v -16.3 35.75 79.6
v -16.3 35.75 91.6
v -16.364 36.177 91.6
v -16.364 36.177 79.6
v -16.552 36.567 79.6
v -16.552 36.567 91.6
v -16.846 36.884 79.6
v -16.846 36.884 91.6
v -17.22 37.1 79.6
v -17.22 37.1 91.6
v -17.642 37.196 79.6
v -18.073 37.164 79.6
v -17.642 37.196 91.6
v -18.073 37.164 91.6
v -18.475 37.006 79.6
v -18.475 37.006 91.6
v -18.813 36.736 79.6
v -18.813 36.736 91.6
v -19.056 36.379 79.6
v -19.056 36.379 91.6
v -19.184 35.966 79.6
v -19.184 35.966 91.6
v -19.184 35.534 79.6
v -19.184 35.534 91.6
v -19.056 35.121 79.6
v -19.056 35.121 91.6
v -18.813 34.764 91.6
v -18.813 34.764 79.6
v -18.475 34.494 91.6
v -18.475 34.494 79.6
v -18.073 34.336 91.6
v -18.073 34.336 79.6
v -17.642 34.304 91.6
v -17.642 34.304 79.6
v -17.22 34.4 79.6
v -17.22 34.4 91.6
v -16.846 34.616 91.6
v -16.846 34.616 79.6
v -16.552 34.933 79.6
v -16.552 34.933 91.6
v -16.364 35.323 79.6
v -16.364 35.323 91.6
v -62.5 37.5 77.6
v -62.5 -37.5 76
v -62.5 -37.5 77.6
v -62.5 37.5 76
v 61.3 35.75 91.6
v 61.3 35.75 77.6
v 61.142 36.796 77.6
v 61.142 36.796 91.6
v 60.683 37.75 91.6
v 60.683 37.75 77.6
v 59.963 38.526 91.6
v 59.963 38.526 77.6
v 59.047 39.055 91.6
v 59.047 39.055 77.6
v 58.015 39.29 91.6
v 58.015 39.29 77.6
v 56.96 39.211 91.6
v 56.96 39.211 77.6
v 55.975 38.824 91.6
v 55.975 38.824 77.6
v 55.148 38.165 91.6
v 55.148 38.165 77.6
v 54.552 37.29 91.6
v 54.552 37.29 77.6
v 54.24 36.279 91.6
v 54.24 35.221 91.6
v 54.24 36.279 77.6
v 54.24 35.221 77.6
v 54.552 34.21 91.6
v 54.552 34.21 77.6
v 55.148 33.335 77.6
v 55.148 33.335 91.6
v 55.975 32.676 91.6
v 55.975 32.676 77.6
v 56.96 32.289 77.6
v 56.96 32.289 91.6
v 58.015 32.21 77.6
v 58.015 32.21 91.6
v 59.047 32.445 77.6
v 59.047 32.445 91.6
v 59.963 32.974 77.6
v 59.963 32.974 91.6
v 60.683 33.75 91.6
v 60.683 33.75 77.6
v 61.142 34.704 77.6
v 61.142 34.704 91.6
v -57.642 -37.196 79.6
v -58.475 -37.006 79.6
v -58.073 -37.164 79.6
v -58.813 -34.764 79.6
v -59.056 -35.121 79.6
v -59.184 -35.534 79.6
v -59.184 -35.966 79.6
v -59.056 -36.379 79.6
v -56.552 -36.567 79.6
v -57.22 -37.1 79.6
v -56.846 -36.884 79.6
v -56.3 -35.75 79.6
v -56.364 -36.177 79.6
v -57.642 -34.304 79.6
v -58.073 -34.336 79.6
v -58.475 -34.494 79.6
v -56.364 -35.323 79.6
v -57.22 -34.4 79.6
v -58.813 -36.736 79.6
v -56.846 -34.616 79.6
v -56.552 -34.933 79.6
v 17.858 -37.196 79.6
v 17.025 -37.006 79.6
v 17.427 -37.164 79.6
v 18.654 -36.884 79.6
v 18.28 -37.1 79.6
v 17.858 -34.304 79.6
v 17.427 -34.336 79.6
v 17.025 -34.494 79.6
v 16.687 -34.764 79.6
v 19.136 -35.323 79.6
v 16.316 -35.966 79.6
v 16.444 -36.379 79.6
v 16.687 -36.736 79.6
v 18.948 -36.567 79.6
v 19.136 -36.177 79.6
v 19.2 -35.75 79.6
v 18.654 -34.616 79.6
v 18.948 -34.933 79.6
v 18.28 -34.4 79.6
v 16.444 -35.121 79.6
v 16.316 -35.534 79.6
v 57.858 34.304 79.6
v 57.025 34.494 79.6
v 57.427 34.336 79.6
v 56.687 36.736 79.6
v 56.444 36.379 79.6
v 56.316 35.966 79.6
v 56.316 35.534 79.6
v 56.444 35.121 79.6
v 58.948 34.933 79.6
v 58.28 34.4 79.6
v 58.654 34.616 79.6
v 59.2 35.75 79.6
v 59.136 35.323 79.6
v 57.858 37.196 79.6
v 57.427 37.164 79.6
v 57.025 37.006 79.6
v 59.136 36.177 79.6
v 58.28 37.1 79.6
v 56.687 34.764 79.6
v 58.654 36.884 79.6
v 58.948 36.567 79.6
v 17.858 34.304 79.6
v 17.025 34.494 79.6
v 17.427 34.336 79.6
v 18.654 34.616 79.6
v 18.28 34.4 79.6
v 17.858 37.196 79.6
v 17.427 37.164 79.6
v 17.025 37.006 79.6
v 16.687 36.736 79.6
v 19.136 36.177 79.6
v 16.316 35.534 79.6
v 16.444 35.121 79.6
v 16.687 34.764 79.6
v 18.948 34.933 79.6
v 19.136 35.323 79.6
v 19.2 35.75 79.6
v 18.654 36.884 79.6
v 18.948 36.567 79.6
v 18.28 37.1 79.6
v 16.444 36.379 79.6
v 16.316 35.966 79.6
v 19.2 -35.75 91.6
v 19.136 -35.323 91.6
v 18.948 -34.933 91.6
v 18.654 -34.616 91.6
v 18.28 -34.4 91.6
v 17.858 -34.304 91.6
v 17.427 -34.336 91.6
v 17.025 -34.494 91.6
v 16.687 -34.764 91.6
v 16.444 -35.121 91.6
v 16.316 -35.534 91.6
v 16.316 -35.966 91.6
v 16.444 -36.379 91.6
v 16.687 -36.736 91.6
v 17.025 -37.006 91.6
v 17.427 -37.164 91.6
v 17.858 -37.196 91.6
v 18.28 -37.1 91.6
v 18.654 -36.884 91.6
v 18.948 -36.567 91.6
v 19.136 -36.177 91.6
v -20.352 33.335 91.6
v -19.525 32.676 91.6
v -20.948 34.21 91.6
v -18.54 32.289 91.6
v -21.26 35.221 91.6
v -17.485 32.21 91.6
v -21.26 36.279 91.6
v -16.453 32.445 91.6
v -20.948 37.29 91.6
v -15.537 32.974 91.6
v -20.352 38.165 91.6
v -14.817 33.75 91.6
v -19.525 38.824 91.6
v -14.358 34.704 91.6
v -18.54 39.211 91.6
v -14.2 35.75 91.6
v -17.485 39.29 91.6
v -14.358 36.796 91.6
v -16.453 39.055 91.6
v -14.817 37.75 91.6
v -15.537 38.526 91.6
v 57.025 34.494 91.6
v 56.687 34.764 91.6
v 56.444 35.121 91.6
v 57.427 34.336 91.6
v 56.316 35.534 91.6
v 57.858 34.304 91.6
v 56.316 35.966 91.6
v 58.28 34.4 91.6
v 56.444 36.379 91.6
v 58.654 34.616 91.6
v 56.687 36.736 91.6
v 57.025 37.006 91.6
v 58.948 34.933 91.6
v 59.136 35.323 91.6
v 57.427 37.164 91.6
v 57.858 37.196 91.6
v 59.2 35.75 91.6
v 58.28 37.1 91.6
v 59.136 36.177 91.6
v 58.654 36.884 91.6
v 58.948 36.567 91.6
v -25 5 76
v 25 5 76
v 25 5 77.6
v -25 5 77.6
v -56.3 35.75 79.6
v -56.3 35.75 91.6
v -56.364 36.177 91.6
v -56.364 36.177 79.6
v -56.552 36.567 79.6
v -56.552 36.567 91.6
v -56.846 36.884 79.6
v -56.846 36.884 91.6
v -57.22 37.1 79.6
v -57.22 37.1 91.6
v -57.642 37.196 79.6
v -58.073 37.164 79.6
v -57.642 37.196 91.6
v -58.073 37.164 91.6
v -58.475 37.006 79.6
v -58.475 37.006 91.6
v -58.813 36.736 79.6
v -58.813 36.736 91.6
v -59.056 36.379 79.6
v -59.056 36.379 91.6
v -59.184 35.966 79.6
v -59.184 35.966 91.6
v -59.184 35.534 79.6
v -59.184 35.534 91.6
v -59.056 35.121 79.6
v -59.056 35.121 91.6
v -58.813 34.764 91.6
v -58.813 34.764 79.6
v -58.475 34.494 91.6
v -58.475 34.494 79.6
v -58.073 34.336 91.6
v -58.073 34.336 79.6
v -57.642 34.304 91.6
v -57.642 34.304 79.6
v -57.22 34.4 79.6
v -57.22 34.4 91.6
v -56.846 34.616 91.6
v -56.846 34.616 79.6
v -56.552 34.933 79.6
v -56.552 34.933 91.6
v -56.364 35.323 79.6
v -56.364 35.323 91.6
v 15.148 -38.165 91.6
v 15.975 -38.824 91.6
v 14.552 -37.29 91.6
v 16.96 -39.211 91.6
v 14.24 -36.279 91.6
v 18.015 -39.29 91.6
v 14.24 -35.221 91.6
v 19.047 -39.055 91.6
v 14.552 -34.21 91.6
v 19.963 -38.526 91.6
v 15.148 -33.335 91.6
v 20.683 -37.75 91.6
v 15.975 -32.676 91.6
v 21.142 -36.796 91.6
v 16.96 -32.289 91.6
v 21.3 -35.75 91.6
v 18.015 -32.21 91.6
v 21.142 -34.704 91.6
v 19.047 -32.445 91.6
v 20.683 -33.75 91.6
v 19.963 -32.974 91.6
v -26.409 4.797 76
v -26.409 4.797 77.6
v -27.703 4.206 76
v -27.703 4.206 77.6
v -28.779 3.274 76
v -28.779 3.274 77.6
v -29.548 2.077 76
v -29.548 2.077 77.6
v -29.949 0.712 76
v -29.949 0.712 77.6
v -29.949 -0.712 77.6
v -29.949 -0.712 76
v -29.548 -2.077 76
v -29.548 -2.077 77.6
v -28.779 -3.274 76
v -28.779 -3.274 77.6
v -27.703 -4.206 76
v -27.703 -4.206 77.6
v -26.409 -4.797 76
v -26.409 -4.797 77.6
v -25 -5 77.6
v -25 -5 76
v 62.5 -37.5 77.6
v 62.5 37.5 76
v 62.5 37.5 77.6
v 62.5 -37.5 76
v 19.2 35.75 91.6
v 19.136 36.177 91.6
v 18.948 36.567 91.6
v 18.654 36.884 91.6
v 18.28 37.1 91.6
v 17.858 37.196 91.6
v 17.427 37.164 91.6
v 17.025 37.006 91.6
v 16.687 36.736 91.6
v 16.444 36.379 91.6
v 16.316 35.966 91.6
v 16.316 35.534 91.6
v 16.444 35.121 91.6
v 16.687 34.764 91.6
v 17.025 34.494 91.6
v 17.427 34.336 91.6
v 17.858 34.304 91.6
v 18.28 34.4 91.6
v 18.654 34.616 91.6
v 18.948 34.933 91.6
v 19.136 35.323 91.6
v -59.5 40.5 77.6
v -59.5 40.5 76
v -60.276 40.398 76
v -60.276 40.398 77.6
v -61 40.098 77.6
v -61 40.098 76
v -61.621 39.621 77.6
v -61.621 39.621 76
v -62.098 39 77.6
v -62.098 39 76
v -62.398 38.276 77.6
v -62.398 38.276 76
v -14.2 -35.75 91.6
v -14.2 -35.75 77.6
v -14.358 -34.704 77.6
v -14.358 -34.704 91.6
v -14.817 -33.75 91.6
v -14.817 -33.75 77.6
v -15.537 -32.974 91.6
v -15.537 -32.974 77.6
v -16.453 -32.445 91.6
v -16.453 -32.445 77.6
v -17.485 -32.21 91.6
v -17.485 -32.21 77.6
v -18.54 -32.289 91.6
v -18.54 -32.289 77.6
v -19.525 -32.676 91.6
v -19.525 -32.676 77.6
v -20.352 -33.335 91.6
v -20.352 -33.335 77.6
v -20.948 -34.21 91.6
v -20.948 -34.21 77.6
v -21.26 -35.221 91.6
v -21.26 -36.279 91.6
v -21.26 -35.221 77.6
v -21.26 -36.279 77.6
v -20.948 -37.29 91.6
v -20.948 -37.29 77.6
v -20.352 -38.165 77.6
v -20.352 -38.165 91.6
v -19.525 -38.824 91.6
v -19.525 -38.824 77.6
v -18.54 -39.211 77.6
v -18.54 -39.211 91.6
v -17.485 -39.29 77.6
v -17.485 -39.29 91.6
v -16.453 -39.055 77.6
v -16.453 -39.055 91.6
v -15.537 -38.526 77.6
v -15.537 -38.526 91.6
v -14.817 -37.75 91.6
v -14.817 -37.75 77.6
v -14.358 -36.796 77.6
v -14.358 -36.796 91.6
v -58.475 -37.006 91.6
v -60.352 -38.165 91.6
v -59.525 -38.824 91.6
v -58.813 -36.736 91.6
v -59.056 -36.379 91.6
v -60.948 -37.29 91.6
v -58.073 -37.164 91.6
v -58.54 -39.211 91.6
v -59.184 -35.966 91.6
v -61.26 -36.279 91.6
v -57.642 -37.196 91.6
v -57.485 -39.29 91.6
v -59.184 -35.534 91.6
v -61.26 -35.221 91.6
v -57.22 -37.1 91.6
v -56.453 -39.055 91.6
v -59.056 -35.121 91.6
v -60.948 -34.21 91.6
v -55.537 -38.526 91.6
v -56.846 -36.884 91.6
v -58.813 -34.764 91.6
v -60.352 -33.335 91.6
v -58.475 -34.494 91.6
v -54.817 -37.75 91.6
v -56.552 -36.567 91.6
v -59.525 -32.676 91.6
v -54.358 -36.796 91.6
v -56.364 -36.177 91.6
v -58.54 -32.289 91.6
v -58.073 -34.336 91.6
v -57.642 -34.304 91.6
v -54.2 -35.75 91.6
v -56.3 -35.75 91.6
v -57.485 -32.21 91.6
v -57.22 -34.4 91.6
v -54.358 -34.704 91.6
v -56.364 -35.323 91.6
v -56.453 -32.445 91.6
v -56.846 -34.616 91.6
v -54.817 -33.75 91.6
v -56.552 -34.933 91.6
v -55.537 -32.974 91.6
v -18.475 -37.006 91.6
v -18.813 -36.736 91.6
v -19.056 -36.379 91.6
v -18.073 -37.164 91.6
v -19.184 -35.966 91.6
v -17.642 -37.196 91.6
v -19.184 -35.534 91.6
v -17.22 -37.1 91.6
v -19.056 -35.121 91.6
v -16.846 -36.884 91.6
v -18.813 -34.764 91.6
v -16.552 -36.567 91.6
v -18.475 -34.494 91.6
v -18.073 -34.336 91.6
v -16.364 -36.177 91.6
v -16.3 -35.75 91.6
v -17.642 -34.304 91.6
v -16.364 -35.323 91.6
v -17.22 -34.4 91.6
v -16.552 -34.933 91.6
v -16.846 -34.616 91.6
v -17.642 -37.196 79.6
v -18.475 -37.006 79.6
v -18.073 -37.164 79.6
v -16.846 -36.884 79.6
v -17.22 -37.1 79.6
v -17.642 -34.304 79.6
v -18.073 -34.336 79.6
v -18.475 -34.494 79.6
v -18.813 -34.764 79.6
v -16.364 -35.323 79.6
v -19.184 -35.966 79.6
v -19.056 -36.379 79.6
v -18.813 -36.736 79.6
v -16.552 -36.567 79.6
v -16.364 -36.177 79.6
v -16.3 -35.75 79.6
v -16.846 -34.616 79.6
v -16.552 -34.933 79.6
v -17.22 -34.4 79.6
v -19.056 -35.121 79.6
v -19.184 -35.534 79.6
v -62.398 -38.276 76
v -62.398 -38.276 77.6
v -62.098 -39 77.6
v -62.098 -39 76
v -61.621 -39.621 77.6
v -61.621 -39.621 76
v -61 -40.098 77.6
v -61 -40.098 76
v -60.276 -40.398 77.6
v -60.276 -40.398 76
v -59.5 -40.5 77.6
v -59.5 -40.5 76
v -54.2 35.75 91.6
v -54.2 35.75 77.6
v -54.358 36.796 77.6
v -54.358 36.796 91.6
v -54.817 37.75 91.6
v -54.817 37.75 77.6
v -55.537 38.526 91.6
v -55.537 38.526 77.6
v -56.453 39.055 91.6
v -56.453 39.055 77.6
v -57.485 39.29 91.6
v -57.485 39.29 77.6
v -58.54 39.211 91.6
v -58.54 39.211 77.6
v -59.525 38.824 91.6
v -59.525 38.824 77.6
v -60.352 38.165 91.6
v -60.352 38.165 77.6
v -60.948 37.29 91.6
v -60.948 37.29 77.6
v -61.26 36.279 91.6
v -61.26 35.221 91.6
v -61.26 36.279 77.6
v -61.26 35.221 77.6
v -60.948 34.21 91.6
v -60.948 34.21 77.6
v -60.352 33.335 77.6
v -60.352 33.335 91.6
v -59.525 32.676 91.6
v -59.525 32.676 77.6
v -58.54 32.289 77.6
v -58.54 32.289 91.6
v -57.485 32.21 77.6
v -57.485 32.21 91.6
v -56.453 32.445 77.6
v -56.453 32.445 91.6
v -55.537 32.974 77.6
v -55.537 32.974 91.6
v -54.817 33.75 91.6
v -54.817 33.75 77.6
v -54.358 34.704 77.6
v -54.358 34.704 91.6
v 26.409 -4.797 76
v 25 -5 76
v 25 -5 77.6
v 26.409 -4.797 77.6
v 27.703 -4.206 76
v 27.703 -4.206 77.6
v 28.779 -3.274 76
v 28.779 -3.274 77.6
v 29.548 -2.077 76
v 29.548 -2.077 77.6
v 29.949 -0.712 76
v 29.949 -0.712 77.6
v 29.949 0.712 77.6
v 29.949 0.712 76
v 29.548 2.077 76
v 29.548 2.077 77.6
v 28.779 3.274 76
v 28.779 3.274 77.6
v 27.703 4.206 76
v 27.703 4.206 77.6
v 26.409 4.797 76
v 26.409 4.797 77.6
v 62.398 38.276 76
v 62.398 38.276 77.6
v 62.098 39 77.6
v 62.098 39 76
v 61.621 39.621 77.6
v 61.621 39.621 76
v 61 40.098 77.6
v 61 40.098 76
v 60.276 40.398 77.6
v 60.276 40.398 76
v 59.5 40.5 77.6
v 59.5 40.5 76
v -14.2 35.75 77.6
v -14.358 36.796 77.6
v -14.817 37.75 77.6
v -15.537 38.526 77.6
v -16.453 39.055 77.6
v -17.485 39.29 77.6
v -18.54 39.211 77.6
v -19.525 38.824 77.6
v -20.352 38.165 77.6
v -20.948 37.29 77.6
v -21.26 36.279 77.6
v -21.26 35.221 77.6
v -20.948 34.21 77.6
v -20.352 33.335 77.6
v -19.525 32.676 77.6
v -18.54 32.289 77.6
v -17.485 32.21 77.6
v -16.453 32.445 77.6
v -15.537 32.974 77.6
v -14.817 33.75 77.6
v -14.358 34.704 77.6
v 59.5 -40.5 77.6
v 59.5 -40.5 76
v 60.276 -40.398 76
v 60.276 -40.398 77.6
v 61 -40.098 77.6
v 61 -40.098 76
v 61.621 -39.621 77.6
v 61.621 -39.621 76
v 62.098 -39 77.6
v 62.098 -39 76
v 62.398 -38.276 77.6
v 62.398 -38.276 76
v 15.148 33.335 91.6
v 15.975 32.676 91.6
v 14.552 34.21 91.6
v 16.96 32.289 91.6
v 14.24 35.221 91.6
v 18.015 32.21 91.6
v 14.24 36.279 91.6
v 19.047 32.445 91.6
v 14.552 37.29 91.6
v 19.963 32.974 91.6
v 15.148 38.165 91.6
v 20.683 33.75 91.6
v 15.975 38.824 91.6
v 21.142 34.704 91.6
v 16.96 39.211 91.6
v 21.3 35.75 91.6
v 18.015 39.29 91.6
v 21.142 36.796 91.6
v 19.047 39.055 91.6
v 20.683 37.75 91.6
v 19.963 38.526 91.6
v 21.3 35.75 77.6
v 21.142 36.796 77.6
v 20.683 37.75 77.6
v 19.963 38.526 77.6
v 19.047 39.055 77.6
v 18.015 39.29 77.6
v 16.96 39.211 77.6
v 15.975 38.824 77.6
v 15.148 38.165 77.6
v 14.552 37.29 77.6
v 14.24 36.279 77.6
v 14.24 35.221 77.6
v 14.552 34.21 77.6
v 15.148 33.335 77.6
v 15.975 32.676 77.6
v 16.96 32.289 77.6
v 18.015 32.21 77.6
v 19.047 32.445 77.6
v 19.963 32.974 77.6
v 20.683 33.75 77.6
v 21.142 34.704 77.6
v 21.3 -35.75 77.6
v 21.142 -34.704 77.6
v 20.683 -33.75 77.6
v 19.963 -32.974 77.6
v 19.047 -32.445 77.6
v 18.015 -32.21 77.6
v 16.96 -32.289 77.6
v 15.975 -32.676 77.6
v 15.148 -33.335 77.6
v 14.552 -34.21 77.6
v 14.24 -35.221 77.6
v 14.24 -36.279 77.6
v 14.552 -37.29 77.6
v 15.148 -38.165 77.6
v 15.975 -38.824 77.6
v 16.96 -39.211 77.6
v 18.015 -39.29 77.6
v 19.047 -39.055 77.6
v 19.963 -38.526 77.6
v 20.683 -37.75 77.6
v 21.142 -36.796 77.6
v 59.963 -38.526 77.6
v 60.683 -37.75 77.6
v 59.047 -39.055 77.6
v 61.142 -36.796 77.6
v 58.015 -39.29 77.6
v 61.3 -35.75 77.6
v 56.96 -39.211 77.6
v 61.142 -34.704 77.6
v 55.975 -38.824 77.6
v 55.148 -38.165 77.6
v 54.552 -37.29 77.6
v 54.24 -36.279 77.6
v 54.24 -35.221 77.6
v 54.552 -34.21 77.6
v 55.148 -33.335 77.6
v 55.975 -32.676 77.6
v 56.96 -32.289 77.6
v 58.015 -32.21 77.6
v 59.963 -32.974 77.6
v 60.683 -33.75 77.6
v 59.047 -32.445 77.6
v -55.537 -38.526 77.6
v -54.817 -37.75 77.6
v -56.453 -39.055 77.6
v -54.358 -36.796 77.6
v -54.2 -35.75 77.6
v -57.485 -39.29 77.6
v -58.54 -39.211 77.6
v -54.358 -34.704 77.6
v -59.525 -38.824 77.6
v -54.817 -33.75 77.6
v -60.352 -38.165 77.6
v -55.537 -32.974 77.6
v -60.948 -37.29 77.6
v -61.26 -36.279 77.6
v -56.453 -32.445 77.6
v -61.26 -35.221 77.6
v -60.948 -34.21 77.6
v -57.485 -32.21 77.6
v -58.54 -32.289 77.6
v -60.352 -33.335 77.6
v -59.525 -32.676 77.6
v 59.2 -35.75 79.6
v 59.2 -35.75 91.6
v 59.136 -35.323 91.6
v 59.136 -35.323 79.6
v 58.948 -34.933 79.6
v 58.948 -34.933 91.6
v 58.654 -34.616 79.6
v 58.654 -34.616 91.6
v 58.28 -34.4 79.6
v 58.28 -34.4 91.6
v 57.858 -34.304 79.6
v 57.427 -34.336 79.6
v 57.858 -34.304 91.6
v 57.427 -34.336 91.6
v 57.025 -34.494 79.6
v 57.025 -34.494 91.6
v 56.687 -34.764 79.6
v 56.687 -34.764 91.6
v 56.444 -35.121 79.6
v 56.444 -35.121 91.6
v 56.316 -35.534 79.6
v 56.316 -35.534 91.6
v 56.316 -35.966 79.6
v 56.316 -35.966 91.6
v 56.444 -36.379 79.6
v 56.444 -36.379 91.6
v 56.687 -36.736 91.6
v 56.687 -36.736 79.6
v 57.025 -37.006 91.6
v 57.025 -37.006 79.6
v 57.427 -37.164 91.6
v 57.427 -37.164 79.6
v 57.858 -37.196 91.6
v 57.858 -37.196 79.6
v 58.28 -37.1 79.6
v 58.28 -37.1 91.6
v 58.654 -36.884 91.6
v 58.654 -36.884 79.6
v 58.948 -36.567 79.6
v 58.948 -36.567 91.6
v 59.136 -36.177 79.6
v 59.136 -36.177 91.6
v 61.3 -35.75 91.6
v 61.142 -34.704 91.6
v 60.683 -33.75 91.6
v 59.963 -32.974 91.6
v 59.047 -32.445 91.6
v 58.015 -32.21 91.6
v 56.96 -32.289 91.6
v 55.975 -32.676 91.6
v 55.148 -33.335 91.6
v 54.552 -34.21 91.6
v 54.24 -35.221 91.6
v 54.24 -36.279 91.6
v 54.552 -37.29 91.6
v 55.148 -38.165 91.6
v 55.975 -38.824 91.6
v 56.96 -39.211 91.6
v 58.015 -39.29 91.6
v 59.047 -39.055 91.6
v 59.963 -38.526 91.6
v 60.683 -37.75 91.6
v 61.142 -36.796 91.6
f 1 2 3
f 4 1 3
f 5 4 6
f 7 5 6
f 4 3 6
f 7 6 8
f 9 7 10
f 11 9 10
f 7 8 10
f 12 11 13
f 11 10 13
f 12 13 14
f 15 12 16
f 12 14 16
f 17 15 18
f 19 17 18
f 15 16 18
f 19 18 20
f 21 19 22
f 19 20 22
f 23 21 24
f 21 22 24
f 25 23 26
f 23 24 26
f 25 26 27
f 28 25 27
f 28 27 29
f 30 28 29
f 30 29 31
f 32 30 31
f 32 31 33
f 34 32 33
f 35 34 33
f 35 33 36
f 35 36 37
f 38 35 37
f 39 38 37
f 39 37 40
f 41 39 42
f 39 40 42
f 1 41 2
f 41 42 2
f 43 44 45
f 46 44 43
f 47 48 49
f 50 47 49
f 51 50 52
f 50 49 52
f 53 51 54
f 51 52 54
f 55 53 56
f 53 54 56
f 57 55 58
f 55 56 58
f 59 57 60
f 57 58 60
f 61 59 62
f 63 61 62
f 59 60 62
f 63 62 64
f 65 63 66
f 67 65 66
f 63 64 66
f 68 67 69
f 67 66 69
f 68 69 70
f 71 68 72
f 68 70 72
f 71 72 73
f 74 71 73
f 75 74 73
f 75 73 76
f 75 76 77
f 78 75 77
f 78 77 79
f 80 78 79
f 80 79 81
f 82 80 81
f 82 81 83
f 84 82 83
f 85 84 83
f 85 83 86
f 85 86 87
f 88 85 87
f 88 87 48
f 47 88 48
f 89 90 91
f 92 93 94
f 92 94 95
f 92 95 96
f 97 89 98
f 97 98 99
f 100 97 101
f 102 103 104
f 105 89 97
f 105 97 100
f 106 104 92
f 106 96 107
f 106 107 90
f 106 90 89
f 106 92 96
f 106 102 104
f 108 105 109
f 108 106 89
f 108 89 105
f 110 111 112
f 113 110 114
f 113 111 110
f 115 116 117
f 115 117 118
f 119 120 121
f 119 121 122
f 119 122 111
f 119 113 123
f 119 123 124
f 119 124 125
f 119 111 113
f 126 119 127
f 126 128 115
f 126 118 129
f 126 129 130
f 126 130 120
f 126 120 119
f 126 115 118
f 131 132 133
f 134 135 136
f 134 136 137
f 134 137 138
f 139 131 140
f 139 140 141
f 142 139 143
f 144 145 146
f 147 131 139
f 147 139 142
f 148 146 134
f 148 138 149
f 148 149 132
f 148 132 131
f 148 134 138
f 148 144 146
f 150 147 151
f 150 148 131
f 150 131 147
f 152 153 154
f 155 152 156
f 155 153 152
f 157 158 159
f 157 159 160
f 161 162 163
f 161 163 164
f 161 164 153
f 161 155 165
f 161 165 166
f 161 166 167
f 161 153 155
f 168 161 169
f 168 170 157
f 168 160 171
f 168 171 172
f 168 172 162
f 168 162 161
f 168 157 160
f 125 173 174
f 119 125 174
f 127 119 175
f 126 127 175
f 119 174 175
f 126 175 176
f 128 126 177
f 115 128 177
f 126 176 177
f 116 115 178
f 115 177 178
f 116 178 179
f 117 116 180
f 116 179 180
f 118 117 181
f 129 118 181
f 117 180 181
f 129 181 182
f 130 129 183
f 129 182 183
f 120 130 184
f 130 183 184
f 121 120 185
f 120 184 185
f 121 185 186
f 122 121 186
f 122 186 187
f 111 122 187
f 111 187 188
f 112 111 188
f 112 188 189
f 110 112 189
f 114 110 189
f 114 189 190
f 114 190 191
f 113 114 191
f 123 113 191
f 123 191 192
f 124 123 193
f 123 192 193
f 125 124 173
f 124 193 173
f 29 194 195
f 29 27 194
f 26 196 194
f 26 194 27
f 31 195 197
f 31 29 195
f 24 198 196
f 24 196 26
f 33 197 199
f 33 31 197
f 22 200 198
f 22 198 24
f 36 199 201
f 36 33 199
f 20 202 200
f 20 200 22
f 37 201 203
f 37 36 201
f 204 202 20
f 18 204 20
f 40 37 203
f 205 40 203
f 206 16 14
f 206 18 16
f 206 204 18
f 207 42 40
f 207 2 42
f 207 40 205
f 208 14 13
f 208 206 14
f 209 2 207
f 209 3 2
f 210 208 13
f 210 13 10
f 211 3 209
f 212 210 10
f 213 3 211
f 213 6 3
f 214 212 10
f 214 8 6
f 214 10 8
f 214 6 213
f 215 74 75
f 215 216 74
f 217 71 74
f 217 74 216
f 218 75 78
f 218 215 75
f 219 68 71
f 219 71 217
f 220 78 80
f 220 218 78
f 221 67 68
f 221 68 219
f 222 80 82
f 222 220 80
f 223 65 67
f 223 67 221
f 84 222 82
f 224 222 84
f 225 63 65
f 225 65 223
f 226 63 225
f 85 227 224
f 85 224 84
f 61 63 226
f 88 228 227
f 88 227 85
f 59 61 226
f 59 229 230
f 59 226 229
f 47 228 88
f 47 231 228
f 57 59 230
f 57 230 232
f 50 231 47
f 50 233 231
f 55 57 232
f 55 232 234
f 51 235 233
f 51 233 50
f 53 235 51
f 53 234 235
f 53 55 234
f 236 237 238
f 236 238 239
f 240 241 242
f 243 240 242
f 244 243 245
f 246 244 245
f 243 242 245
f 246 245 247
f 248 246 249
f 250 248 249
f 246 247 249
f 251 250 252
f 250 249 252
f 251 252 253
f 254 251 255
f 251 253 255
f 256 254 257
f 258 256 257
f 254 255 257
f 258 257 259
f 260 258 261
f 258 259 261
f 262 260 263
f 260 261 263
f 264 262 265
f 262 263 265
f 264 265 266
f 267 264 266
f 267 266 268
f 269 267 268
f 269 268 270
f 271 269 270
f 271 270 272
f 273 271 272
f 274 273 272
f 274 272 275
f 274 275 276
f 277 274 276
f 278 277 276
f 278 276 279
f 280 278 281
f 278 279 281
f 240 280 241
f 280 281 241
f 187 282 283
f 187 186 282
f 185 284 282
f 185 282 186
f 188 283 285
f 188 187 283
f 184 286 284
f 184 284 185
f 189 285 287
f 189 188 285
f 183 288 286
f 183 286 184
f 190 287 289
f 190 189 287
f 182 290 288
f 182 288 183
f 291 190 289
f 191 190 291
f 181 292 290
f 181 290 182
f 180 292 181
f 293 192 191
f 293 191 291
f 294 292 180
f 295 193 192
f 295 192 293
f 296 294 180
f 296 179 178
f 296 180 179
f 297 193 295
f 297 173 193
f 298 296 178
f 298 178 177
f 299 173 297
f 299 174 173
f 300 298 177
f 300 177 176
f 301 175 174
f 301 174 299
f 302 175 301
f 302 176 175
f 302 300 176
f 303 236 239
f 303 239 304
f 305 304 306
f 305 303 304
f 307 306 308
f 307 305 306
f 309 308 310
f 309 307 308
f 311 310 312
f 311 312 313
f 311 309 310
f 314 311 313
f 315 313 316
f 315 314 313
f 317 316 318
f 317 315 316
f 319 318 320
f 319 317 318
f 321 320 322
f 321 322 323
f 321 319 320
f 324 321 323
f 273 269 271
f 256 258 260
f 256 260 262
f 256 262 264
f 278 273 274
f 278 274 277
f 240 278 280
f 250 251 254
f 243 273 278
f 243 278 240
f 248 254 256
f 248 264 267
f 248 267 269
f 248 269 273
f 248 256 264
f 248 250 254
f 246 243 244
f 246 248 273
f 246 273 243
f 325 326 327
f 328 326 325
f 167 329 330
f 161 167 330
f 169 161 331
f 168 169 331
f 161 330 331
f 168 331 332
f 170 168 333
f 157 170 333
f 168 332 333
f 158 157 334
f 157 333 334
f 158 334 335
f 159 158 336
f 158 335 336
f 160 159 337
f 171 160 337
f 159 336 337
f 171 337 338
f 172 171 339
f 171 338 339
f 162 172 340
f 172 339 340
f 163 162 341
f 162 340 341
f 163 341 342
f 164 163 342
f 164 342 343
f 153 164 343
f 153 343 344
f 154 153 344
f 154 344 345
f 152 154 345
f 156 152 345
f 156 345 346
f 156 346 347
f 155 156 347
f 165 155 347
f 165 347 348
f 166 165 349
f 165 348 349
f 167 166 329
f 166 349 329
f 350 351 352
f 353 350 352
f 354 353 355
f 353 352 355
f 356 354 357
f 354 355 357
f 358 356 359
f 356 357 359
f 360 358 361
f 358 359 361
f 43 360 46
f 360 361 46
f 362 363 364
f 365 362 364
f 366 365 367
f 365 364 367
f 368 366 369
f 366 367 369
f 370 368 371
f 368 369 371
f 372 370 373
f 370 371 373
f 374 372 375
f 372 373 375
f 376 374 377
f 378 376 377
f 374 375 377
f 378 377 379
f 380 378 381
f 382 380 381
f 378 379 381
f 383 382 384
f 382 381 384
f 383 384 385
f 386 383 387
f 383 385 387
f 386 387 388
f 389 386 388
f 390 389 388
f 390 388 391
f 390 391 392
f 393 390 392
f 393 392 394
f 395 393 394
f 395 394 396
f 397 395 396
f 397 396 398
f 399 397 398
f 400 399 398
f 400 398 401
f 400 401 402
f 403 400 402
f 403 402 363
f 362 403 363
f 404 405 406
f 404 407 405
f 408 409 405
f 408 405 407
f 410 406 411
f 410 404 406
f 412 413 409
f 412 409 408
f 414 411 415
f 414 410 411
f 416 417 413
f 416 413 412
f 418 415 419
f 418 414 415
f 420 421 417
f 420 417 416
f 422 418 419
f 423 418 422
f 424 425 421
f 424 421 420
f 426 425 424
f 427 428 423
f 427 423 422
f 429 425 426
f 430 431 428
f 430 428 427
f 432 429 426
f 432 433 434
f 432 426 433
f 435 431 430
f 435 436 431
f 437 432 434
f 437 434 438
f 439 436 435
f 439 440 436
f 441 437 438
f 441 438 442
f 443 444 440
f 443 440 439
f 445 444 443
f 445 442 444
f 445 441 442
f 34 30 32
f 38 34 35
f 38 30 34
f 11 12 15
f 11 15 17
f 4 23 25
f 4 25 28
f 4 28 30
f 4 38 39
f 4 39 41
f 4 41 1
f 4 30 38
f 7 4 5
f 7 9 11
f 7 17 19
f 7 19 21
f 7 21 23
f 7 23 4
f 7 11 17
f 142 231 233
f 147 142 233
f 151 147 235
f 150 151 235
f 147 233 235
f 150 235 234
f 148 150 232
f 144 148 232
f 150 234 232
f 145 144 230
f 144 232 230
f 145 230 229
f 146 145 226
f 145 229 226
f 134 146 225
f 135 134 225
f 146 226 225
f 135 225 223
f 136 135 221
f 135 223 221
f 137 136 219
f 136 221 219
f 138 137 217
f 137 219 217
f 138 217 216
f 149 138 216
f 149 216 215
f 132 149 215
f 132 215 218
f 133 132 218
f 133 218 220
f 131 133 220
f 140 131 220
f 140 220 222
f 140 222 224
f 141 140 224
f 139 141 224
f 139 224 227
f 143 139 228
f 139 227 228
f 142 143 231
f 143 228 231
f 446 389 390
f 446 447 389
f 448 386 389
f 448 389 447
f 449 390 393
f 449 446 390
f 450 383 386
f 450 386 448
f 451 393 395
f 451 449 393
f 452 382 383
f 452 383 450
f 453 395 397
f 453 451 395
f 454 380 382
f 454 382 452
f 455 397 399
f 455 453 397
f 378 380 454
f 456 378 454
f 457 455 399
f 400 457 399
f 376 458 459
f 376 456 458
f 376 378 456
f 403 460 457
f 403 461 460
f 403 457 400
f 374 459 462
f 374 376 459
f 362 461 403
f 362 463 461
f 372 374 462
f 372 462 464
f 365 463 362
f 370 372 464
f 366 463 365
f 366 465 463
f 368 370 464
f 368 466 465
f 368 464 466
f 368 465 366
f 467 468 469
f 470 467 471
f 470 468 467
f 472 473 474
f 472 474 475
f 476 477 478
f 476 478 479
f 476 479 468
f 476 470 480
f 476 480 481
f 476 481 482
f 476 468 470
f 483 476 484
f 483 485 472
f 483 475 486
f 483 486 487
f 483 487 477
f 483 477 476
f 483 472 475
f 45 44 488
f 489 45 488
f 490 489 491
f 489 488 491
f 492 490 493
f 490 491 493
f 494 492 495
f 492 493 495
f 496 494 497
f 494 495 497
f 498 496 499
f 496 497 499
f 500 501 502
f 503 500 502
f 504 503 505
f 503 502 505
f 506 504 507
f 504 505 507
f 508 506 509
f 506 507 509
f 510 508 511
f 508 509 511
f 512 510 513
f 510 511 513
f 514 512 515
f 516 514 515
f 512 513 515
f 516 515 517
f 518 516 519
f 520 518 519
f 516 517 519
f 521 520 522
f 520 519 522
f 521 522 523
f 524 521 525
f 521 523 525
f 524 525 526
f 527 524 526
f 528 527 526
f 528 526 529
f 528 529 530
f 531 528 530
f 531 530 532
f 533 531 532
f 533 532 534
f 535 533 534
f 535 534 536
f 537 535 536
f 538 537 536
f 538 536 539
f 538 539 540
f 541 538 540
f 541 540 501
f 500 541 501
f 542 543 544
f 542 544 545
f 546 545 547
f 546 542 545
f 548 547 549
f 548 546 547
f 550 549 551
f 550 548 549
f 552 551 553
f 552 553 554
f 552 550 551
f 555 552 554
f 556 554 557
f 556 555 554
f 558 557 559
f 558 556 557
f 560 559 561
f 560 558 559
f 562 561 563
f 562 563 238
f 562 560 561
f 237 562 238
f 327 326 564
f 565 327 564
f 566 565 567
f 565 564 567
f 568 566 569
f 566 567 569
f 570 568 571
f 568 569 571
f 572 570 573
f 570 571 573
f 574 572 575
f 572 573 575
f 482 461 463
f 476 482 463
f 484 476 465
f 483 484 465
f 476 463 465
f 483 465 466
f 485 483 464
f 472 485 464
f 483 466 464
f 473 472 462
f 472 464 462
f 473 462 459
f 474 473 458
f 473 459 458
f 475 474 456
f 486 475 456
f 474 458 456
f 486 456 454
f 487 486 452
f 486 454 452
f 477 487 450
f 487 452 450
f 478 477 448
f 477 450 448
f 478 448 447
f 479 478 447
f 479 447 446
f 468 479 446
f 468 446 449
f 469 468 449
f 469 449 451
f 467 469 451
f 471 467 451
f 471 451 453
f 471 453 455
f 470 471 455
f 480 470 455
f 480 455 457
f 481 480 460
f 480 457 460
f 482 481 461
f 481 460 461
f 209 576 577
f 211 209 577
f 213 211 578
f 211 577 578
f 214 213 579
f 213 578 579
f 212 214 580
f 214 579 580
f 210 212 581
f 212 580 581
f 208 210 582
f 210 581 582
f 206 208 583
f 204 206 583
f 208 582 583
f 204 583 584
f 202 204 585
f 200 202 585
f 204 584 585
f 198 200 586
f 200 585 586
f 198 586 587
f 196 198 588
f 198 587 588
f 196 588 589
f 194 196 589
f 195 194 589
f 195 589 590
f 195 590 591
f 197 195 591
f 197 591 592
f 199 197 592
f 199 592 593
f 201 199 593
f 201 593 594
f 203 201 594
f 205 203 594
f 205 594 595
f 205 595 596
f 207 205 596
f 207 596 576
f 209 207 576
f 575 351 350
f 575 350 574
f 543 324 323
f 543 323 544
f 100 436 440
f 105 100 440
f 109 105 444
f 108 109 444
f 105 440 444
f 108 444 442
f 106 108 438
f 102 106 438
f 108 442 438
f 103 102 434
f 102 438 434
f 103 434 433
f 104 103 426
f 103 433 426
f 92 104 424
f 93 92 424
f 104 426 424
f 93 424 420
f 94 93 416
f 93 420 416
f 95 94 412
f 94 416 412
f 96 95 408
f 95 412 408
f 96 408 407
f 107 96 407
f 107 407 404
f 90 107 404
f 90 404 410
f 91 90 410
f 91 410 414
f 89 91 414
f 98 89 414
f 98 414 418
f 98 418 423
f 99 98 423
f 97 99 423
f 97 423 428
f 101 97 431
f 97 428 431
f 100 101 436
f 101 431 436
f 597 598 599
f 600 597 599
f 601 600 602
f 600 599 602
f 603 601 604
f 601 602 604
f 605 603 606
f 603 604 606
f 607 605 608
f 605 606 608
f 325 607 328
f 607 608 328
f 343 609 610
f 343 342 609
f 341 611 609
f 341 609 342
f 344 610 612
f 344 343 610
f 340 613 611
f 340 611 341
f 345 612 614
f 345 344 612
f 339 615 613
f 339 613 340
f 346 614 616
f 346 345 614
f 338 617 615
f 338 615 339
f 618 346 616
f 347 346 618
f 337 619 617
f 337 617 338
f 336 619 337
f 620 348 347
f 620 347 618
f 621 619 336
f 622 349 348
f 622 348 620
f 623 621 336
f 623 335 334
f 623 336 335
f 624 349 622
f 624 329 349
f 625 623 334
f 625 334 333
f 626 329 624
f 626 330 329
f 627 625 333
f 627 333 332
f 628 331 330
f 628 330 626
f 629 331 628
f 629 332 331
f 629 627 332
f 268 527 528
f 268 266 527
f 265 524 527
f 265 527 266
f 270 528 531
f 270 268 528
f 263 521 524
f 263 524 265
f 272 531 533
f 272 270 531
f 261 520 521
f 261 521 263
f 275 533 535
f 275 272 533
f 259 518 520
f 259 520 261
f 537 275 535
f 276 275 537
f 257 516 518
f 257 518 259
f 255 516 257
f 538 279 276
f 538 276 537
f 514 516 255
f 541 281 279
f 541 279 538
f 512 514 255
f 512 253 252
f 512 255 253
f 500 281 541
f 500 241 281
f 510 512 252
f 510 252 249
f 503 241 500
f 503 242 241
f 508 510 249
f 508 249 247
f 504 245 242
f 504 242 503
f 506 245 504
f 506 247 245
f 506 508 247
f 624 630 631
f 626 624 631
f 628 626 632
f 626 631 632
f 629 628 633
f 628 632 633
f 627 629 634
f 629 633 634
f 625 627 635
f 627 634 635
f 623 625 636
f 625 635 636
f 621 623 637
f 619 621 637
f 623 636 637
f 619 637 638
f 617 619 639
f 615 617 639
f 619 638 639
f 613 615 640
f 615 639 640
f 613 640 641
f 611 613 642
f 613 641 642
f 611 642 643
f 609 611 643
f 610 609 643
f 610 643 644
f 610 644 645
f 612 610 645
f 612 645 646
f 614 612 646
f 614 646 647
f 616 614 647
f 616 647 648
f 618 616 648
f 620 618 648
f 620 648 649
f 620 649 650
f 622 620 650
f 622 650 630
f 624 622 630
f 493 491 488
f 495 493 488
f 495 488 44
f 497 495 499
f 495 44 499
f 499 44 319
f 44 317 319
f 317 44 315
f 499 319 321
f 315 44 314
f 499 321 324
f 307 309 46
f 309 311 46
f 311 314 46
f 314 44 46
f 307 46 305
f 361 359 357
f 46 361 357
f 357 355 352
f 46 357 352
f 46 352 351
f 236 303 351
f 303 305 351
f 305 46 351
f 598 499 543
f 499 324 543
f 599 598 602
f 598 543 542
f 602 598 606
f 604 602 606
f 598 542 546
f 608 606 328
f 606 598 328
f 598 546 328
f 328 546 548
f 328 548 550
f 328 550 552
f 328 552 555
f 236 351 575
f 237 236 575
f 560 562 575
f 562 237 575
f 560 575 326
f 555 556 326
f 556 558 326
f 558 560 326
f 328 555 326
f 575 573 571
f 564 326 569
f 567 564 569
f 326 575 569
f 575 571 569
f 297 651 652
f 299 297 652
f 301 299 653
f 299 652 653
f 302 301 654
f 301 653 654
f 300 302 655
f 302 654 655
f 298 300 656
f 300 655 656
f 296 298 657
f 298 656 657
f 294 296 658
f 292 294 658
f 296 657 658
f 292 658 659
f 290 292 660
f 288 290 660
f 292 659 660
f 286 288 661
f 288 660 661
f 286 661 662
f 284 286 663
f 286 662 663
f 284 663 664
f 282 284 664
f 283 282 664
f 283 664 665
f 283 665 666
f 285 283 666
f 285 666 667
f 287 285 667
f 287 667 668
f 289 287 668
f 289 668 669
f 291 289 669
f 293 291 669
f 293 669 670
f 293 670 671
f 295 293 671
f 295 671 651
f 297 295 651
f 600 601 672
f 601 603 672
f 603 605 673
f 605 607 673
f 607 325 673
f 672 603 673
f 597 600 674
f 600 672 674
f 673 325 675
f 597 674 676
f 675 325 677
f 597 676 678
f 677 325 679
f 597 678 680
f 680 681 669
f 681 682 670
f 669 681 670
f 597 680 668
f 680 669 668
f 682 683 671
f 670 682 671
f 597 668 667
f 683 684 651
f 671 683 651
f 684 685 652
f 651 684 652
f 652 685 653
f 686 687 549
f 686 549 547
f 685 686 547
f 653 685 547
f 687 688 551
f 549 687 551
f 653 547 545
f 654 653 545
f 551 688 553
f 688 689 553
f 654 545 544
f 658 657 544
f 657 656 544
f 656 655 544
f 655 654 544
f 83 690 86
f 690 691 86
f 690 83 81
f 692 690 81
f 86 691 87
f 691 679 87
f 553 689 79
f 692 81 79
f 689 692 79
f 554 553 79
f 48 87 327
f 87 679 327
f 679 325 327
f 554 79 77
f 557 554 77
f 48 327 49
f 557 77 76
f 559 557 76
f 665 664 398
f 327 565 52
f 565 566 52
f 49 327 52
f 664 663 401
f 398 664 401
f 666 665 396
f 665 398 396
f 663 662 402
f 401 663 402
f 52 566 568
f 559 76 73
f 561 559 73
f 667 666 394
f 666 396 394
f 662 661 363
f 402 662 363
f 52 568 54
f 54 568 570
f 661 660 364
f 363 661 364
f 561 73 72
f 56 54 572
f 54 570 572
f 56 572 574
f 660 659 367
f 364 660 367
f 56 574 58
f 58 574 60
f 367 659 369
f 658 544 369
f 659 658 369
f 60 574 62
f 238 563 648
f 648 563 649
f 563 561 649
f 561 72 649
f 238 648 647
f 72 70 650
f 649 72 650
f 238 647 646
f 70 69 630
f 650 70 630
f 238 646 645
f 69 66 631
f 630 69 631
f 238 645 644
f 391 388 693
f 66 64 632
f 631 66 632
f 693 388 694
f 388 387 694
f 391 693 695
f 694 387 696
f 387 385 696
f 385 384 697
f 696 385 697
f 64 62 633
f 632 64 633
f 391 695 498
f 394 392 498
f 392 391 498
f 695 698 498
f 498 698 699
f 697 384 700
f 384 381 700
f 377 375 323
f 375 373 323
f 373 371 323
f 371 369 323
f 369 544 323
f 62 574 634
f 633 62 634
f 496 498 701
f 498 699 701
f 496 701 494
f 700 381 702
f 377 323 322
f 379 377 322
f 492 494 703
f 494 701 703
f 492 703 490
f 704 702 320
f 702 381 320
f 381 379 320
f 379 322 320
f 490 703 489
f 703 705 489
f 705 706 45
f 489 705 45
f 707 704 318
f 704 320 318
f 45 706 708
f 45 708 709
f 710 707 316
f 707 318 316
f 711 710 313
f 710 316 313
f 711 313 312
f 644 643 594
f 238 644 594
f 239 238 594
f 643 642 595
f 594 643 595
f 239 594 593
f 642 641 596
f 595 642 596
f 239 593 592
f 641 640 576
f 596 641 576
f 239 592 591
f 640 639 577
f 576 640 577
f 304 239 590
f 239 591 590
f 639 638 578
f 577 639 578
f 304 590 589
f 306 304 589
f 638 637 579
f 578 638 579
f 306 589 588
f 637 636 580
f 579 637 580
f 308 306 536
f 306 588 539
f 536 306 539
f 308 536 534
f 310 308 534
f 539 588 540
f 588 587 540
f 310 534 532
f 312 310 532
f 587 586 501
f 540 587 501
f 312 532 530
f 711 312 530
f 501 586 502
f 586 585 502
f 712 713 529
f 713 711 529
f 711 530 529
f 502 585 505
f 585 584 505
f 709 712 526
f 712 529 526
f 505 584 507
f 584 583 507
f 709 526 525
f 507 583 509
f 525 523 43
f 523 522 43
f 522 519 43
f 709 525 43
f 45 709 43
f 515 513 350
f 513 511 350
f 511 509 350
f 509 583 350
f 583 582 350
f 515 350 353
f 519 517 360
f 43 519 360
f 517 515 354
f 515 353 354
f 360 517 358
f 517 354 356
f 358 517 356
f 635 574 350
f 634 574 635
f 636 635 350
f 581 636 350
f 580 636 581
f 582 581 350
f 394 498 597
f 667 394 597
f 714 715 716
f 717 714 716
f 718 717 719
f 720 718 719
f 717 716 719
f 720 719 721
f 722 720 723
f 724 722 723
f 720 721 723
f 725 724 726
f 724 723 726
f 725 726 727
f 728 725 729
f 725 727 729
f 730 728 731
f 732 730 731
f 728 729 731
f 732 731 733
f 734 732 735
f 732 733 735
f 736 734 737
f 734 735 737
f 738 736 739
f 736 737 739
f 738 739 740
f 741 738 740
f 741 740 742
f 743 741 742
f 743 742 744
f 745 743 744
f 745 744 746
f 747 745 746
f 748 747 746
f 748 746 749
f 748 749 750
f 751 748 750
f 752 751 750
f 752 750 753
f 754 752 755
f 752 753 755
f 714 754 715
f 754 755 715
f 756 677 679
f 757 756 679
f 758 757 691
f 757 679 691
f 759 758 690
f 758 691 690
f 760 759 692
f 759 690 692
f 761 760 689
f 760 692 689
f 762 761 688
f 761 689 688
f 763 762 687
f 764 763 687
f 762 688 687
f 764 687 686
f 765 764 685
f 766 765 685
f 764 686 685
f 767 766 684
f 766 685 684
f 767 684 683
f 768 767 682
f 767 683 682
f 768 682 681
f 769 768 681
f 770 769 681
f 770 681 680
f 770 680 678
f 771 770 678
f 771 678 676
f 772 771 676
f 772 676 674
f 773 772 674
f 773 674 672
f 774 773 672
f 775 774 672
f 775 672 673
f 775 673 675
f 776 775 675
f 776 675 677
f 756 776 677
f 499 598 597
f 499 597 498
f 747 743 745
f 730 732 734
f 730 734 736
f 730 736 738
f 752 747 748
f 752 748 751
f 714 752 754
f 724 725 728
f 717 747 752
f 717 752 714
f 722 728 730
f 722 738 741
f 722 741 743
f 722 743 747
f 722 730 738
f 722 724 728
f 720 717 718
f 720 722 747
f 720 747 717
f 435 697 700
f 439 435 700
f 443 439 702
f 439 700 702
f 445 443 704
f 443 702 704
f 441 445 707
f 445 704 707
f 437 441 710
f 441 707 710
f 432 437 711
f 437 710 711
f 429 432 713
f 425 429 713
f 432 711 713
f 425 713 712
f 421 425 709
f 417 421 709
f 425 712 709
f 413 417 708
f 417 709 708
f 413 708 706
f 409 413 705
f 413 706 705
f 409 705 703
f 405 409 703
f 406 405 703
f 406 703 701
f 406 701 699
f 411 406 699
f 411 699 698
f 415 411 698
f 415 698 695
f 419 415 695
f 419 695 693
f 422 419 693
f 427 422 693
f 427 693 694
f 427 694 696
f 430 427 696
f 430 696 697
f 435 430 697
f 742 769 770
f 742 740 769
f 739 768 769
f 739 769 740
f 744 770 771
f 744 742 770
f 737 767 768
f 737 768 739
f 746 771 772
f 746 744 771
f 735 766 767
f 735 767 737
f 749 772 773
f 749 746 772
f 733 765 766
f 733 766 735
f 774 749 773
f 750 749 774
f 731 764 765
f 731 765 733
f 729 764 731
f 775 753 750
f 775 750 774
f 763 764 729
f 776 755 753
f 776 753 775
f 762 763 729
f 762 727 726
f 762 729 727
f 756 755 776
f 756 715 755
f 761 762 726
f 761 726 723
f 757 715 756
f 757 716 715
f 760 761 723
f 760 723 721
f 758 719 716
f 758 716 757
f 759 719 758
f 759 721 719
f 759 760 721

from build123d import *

# Parameters (mm, degrees)
PAD005_DEPTH    = 1.6
SKETCH008_R     = 3.55
PAD006_DEPTH    = 15.6
SKETCH009_R     = 1.45
POCKET002_DEPTH = 12
POCKET003_DEPTH = 1.6


with BuildPart() as part:
    # Sketch007 → Pad005 (new body)
    with BuildSketch(Plane.XY):
        with BuildLine():
            Line((-59.5, 40.5), (59.5, 40.5))
            ThreePointArc((62.5, 37.5), (61.62132, 39.62132), (59.5, 40.5))
            Line((62.5, 37.5), (62.5, -37.5))
            ThreePointArc((59.5, -40.5), (61.62132, -39.62132), (62.5, -37.5))
            Line((59.5, -40.5), (-59.5, -40.5))
            ThreePointArc((-62.5, -37.5), (-61.62132, -39.62132), (-59.5, -40.5))
            Line((-62.5, -37.5), (-62.5, 37.5))
            ThreePointArc((-59.5, 40.5), (-61.62132, 39.62132), (-62.5, 37.5))
        make_face()
    extrude(amount=PAD005_DEPTH)

    # Sketch008 → Pad006 (join)
    with BuildSketch(Plane.XY):
        with Locations((-57.75, 35.75)):
            Circle(SKETCH008_R)
        with Locations((-17.75, 35.75)):
            Circle(SKETCH008_R)
        with Locations((17.75, 35.75)):
            Circle(SKETCH008_R)
        with Locations((57.75, 35.75)):
            Circle(SKETCH008_R)
        with Locations((57.75, -35.75)):
            Circle(SKETCH008_R)
        with Locations((17.75, -35.75)):
            Circle(SKETCH008_R)
        with Locations((-17.75, -35.75)):
            Circle(SKETCH008_R)
        with Locations((-57.75, -35.75)):
            Circle(SKETCH008_R)
    extrude(amount=PAD006_DEPTH)

    # Sketch009 (on DatumPlane) → Pocket002 (cut)
    with BuildSketch(Plane.XY.offset(15.6)):
        with Locations((-57.75, 35.75)):
            Circle(SKETCH009_R)
        with Locations((-17.75, 35.75)):
            Circle(SKETCH009_R)
        with Locations((17.75, 35.75)):
            Circle(SKETCH009_R)
        with Locations((57.75, 35.75)):
            Circle(SKETCH009_R)
        with Locations((-57.75, -35.75)):
            Circle(SKETCH009_R)
        with Locations((-17.75, -35.75)):
            Circle(SKETCH009_R)
        with Locations((17.75, -35.75)):
            Circle(SKETCH009_R)
        with Locations((57.75, -35.75)):
            Circle(SKETCH009_R)
    extrude(amount=-POCKET002_DEPTH, mode=Mode.SUBTRACT)

    # Sketch011 → Pocket003 (cut)
    with BuildSketch(Plane.XY):
        with BuildLine():
            ThreePointArc((-25, 5), (-30, 0), (-25, -5))
            Line((-25, -5), (25, -5))
            ThreePointArc((25, -5), (30, 0), (25, 5))
            Line((25, 5), (-25, 5))
        make_face()
    extrude(amount=POCKET003_DEPTH, mode=Mode.SUBTRACT)


with BuildPart() as part_1:
    # Body002 placement: moved
    add(part.part.moved(Location((0, 0, 76))))


solid = part_1.part
